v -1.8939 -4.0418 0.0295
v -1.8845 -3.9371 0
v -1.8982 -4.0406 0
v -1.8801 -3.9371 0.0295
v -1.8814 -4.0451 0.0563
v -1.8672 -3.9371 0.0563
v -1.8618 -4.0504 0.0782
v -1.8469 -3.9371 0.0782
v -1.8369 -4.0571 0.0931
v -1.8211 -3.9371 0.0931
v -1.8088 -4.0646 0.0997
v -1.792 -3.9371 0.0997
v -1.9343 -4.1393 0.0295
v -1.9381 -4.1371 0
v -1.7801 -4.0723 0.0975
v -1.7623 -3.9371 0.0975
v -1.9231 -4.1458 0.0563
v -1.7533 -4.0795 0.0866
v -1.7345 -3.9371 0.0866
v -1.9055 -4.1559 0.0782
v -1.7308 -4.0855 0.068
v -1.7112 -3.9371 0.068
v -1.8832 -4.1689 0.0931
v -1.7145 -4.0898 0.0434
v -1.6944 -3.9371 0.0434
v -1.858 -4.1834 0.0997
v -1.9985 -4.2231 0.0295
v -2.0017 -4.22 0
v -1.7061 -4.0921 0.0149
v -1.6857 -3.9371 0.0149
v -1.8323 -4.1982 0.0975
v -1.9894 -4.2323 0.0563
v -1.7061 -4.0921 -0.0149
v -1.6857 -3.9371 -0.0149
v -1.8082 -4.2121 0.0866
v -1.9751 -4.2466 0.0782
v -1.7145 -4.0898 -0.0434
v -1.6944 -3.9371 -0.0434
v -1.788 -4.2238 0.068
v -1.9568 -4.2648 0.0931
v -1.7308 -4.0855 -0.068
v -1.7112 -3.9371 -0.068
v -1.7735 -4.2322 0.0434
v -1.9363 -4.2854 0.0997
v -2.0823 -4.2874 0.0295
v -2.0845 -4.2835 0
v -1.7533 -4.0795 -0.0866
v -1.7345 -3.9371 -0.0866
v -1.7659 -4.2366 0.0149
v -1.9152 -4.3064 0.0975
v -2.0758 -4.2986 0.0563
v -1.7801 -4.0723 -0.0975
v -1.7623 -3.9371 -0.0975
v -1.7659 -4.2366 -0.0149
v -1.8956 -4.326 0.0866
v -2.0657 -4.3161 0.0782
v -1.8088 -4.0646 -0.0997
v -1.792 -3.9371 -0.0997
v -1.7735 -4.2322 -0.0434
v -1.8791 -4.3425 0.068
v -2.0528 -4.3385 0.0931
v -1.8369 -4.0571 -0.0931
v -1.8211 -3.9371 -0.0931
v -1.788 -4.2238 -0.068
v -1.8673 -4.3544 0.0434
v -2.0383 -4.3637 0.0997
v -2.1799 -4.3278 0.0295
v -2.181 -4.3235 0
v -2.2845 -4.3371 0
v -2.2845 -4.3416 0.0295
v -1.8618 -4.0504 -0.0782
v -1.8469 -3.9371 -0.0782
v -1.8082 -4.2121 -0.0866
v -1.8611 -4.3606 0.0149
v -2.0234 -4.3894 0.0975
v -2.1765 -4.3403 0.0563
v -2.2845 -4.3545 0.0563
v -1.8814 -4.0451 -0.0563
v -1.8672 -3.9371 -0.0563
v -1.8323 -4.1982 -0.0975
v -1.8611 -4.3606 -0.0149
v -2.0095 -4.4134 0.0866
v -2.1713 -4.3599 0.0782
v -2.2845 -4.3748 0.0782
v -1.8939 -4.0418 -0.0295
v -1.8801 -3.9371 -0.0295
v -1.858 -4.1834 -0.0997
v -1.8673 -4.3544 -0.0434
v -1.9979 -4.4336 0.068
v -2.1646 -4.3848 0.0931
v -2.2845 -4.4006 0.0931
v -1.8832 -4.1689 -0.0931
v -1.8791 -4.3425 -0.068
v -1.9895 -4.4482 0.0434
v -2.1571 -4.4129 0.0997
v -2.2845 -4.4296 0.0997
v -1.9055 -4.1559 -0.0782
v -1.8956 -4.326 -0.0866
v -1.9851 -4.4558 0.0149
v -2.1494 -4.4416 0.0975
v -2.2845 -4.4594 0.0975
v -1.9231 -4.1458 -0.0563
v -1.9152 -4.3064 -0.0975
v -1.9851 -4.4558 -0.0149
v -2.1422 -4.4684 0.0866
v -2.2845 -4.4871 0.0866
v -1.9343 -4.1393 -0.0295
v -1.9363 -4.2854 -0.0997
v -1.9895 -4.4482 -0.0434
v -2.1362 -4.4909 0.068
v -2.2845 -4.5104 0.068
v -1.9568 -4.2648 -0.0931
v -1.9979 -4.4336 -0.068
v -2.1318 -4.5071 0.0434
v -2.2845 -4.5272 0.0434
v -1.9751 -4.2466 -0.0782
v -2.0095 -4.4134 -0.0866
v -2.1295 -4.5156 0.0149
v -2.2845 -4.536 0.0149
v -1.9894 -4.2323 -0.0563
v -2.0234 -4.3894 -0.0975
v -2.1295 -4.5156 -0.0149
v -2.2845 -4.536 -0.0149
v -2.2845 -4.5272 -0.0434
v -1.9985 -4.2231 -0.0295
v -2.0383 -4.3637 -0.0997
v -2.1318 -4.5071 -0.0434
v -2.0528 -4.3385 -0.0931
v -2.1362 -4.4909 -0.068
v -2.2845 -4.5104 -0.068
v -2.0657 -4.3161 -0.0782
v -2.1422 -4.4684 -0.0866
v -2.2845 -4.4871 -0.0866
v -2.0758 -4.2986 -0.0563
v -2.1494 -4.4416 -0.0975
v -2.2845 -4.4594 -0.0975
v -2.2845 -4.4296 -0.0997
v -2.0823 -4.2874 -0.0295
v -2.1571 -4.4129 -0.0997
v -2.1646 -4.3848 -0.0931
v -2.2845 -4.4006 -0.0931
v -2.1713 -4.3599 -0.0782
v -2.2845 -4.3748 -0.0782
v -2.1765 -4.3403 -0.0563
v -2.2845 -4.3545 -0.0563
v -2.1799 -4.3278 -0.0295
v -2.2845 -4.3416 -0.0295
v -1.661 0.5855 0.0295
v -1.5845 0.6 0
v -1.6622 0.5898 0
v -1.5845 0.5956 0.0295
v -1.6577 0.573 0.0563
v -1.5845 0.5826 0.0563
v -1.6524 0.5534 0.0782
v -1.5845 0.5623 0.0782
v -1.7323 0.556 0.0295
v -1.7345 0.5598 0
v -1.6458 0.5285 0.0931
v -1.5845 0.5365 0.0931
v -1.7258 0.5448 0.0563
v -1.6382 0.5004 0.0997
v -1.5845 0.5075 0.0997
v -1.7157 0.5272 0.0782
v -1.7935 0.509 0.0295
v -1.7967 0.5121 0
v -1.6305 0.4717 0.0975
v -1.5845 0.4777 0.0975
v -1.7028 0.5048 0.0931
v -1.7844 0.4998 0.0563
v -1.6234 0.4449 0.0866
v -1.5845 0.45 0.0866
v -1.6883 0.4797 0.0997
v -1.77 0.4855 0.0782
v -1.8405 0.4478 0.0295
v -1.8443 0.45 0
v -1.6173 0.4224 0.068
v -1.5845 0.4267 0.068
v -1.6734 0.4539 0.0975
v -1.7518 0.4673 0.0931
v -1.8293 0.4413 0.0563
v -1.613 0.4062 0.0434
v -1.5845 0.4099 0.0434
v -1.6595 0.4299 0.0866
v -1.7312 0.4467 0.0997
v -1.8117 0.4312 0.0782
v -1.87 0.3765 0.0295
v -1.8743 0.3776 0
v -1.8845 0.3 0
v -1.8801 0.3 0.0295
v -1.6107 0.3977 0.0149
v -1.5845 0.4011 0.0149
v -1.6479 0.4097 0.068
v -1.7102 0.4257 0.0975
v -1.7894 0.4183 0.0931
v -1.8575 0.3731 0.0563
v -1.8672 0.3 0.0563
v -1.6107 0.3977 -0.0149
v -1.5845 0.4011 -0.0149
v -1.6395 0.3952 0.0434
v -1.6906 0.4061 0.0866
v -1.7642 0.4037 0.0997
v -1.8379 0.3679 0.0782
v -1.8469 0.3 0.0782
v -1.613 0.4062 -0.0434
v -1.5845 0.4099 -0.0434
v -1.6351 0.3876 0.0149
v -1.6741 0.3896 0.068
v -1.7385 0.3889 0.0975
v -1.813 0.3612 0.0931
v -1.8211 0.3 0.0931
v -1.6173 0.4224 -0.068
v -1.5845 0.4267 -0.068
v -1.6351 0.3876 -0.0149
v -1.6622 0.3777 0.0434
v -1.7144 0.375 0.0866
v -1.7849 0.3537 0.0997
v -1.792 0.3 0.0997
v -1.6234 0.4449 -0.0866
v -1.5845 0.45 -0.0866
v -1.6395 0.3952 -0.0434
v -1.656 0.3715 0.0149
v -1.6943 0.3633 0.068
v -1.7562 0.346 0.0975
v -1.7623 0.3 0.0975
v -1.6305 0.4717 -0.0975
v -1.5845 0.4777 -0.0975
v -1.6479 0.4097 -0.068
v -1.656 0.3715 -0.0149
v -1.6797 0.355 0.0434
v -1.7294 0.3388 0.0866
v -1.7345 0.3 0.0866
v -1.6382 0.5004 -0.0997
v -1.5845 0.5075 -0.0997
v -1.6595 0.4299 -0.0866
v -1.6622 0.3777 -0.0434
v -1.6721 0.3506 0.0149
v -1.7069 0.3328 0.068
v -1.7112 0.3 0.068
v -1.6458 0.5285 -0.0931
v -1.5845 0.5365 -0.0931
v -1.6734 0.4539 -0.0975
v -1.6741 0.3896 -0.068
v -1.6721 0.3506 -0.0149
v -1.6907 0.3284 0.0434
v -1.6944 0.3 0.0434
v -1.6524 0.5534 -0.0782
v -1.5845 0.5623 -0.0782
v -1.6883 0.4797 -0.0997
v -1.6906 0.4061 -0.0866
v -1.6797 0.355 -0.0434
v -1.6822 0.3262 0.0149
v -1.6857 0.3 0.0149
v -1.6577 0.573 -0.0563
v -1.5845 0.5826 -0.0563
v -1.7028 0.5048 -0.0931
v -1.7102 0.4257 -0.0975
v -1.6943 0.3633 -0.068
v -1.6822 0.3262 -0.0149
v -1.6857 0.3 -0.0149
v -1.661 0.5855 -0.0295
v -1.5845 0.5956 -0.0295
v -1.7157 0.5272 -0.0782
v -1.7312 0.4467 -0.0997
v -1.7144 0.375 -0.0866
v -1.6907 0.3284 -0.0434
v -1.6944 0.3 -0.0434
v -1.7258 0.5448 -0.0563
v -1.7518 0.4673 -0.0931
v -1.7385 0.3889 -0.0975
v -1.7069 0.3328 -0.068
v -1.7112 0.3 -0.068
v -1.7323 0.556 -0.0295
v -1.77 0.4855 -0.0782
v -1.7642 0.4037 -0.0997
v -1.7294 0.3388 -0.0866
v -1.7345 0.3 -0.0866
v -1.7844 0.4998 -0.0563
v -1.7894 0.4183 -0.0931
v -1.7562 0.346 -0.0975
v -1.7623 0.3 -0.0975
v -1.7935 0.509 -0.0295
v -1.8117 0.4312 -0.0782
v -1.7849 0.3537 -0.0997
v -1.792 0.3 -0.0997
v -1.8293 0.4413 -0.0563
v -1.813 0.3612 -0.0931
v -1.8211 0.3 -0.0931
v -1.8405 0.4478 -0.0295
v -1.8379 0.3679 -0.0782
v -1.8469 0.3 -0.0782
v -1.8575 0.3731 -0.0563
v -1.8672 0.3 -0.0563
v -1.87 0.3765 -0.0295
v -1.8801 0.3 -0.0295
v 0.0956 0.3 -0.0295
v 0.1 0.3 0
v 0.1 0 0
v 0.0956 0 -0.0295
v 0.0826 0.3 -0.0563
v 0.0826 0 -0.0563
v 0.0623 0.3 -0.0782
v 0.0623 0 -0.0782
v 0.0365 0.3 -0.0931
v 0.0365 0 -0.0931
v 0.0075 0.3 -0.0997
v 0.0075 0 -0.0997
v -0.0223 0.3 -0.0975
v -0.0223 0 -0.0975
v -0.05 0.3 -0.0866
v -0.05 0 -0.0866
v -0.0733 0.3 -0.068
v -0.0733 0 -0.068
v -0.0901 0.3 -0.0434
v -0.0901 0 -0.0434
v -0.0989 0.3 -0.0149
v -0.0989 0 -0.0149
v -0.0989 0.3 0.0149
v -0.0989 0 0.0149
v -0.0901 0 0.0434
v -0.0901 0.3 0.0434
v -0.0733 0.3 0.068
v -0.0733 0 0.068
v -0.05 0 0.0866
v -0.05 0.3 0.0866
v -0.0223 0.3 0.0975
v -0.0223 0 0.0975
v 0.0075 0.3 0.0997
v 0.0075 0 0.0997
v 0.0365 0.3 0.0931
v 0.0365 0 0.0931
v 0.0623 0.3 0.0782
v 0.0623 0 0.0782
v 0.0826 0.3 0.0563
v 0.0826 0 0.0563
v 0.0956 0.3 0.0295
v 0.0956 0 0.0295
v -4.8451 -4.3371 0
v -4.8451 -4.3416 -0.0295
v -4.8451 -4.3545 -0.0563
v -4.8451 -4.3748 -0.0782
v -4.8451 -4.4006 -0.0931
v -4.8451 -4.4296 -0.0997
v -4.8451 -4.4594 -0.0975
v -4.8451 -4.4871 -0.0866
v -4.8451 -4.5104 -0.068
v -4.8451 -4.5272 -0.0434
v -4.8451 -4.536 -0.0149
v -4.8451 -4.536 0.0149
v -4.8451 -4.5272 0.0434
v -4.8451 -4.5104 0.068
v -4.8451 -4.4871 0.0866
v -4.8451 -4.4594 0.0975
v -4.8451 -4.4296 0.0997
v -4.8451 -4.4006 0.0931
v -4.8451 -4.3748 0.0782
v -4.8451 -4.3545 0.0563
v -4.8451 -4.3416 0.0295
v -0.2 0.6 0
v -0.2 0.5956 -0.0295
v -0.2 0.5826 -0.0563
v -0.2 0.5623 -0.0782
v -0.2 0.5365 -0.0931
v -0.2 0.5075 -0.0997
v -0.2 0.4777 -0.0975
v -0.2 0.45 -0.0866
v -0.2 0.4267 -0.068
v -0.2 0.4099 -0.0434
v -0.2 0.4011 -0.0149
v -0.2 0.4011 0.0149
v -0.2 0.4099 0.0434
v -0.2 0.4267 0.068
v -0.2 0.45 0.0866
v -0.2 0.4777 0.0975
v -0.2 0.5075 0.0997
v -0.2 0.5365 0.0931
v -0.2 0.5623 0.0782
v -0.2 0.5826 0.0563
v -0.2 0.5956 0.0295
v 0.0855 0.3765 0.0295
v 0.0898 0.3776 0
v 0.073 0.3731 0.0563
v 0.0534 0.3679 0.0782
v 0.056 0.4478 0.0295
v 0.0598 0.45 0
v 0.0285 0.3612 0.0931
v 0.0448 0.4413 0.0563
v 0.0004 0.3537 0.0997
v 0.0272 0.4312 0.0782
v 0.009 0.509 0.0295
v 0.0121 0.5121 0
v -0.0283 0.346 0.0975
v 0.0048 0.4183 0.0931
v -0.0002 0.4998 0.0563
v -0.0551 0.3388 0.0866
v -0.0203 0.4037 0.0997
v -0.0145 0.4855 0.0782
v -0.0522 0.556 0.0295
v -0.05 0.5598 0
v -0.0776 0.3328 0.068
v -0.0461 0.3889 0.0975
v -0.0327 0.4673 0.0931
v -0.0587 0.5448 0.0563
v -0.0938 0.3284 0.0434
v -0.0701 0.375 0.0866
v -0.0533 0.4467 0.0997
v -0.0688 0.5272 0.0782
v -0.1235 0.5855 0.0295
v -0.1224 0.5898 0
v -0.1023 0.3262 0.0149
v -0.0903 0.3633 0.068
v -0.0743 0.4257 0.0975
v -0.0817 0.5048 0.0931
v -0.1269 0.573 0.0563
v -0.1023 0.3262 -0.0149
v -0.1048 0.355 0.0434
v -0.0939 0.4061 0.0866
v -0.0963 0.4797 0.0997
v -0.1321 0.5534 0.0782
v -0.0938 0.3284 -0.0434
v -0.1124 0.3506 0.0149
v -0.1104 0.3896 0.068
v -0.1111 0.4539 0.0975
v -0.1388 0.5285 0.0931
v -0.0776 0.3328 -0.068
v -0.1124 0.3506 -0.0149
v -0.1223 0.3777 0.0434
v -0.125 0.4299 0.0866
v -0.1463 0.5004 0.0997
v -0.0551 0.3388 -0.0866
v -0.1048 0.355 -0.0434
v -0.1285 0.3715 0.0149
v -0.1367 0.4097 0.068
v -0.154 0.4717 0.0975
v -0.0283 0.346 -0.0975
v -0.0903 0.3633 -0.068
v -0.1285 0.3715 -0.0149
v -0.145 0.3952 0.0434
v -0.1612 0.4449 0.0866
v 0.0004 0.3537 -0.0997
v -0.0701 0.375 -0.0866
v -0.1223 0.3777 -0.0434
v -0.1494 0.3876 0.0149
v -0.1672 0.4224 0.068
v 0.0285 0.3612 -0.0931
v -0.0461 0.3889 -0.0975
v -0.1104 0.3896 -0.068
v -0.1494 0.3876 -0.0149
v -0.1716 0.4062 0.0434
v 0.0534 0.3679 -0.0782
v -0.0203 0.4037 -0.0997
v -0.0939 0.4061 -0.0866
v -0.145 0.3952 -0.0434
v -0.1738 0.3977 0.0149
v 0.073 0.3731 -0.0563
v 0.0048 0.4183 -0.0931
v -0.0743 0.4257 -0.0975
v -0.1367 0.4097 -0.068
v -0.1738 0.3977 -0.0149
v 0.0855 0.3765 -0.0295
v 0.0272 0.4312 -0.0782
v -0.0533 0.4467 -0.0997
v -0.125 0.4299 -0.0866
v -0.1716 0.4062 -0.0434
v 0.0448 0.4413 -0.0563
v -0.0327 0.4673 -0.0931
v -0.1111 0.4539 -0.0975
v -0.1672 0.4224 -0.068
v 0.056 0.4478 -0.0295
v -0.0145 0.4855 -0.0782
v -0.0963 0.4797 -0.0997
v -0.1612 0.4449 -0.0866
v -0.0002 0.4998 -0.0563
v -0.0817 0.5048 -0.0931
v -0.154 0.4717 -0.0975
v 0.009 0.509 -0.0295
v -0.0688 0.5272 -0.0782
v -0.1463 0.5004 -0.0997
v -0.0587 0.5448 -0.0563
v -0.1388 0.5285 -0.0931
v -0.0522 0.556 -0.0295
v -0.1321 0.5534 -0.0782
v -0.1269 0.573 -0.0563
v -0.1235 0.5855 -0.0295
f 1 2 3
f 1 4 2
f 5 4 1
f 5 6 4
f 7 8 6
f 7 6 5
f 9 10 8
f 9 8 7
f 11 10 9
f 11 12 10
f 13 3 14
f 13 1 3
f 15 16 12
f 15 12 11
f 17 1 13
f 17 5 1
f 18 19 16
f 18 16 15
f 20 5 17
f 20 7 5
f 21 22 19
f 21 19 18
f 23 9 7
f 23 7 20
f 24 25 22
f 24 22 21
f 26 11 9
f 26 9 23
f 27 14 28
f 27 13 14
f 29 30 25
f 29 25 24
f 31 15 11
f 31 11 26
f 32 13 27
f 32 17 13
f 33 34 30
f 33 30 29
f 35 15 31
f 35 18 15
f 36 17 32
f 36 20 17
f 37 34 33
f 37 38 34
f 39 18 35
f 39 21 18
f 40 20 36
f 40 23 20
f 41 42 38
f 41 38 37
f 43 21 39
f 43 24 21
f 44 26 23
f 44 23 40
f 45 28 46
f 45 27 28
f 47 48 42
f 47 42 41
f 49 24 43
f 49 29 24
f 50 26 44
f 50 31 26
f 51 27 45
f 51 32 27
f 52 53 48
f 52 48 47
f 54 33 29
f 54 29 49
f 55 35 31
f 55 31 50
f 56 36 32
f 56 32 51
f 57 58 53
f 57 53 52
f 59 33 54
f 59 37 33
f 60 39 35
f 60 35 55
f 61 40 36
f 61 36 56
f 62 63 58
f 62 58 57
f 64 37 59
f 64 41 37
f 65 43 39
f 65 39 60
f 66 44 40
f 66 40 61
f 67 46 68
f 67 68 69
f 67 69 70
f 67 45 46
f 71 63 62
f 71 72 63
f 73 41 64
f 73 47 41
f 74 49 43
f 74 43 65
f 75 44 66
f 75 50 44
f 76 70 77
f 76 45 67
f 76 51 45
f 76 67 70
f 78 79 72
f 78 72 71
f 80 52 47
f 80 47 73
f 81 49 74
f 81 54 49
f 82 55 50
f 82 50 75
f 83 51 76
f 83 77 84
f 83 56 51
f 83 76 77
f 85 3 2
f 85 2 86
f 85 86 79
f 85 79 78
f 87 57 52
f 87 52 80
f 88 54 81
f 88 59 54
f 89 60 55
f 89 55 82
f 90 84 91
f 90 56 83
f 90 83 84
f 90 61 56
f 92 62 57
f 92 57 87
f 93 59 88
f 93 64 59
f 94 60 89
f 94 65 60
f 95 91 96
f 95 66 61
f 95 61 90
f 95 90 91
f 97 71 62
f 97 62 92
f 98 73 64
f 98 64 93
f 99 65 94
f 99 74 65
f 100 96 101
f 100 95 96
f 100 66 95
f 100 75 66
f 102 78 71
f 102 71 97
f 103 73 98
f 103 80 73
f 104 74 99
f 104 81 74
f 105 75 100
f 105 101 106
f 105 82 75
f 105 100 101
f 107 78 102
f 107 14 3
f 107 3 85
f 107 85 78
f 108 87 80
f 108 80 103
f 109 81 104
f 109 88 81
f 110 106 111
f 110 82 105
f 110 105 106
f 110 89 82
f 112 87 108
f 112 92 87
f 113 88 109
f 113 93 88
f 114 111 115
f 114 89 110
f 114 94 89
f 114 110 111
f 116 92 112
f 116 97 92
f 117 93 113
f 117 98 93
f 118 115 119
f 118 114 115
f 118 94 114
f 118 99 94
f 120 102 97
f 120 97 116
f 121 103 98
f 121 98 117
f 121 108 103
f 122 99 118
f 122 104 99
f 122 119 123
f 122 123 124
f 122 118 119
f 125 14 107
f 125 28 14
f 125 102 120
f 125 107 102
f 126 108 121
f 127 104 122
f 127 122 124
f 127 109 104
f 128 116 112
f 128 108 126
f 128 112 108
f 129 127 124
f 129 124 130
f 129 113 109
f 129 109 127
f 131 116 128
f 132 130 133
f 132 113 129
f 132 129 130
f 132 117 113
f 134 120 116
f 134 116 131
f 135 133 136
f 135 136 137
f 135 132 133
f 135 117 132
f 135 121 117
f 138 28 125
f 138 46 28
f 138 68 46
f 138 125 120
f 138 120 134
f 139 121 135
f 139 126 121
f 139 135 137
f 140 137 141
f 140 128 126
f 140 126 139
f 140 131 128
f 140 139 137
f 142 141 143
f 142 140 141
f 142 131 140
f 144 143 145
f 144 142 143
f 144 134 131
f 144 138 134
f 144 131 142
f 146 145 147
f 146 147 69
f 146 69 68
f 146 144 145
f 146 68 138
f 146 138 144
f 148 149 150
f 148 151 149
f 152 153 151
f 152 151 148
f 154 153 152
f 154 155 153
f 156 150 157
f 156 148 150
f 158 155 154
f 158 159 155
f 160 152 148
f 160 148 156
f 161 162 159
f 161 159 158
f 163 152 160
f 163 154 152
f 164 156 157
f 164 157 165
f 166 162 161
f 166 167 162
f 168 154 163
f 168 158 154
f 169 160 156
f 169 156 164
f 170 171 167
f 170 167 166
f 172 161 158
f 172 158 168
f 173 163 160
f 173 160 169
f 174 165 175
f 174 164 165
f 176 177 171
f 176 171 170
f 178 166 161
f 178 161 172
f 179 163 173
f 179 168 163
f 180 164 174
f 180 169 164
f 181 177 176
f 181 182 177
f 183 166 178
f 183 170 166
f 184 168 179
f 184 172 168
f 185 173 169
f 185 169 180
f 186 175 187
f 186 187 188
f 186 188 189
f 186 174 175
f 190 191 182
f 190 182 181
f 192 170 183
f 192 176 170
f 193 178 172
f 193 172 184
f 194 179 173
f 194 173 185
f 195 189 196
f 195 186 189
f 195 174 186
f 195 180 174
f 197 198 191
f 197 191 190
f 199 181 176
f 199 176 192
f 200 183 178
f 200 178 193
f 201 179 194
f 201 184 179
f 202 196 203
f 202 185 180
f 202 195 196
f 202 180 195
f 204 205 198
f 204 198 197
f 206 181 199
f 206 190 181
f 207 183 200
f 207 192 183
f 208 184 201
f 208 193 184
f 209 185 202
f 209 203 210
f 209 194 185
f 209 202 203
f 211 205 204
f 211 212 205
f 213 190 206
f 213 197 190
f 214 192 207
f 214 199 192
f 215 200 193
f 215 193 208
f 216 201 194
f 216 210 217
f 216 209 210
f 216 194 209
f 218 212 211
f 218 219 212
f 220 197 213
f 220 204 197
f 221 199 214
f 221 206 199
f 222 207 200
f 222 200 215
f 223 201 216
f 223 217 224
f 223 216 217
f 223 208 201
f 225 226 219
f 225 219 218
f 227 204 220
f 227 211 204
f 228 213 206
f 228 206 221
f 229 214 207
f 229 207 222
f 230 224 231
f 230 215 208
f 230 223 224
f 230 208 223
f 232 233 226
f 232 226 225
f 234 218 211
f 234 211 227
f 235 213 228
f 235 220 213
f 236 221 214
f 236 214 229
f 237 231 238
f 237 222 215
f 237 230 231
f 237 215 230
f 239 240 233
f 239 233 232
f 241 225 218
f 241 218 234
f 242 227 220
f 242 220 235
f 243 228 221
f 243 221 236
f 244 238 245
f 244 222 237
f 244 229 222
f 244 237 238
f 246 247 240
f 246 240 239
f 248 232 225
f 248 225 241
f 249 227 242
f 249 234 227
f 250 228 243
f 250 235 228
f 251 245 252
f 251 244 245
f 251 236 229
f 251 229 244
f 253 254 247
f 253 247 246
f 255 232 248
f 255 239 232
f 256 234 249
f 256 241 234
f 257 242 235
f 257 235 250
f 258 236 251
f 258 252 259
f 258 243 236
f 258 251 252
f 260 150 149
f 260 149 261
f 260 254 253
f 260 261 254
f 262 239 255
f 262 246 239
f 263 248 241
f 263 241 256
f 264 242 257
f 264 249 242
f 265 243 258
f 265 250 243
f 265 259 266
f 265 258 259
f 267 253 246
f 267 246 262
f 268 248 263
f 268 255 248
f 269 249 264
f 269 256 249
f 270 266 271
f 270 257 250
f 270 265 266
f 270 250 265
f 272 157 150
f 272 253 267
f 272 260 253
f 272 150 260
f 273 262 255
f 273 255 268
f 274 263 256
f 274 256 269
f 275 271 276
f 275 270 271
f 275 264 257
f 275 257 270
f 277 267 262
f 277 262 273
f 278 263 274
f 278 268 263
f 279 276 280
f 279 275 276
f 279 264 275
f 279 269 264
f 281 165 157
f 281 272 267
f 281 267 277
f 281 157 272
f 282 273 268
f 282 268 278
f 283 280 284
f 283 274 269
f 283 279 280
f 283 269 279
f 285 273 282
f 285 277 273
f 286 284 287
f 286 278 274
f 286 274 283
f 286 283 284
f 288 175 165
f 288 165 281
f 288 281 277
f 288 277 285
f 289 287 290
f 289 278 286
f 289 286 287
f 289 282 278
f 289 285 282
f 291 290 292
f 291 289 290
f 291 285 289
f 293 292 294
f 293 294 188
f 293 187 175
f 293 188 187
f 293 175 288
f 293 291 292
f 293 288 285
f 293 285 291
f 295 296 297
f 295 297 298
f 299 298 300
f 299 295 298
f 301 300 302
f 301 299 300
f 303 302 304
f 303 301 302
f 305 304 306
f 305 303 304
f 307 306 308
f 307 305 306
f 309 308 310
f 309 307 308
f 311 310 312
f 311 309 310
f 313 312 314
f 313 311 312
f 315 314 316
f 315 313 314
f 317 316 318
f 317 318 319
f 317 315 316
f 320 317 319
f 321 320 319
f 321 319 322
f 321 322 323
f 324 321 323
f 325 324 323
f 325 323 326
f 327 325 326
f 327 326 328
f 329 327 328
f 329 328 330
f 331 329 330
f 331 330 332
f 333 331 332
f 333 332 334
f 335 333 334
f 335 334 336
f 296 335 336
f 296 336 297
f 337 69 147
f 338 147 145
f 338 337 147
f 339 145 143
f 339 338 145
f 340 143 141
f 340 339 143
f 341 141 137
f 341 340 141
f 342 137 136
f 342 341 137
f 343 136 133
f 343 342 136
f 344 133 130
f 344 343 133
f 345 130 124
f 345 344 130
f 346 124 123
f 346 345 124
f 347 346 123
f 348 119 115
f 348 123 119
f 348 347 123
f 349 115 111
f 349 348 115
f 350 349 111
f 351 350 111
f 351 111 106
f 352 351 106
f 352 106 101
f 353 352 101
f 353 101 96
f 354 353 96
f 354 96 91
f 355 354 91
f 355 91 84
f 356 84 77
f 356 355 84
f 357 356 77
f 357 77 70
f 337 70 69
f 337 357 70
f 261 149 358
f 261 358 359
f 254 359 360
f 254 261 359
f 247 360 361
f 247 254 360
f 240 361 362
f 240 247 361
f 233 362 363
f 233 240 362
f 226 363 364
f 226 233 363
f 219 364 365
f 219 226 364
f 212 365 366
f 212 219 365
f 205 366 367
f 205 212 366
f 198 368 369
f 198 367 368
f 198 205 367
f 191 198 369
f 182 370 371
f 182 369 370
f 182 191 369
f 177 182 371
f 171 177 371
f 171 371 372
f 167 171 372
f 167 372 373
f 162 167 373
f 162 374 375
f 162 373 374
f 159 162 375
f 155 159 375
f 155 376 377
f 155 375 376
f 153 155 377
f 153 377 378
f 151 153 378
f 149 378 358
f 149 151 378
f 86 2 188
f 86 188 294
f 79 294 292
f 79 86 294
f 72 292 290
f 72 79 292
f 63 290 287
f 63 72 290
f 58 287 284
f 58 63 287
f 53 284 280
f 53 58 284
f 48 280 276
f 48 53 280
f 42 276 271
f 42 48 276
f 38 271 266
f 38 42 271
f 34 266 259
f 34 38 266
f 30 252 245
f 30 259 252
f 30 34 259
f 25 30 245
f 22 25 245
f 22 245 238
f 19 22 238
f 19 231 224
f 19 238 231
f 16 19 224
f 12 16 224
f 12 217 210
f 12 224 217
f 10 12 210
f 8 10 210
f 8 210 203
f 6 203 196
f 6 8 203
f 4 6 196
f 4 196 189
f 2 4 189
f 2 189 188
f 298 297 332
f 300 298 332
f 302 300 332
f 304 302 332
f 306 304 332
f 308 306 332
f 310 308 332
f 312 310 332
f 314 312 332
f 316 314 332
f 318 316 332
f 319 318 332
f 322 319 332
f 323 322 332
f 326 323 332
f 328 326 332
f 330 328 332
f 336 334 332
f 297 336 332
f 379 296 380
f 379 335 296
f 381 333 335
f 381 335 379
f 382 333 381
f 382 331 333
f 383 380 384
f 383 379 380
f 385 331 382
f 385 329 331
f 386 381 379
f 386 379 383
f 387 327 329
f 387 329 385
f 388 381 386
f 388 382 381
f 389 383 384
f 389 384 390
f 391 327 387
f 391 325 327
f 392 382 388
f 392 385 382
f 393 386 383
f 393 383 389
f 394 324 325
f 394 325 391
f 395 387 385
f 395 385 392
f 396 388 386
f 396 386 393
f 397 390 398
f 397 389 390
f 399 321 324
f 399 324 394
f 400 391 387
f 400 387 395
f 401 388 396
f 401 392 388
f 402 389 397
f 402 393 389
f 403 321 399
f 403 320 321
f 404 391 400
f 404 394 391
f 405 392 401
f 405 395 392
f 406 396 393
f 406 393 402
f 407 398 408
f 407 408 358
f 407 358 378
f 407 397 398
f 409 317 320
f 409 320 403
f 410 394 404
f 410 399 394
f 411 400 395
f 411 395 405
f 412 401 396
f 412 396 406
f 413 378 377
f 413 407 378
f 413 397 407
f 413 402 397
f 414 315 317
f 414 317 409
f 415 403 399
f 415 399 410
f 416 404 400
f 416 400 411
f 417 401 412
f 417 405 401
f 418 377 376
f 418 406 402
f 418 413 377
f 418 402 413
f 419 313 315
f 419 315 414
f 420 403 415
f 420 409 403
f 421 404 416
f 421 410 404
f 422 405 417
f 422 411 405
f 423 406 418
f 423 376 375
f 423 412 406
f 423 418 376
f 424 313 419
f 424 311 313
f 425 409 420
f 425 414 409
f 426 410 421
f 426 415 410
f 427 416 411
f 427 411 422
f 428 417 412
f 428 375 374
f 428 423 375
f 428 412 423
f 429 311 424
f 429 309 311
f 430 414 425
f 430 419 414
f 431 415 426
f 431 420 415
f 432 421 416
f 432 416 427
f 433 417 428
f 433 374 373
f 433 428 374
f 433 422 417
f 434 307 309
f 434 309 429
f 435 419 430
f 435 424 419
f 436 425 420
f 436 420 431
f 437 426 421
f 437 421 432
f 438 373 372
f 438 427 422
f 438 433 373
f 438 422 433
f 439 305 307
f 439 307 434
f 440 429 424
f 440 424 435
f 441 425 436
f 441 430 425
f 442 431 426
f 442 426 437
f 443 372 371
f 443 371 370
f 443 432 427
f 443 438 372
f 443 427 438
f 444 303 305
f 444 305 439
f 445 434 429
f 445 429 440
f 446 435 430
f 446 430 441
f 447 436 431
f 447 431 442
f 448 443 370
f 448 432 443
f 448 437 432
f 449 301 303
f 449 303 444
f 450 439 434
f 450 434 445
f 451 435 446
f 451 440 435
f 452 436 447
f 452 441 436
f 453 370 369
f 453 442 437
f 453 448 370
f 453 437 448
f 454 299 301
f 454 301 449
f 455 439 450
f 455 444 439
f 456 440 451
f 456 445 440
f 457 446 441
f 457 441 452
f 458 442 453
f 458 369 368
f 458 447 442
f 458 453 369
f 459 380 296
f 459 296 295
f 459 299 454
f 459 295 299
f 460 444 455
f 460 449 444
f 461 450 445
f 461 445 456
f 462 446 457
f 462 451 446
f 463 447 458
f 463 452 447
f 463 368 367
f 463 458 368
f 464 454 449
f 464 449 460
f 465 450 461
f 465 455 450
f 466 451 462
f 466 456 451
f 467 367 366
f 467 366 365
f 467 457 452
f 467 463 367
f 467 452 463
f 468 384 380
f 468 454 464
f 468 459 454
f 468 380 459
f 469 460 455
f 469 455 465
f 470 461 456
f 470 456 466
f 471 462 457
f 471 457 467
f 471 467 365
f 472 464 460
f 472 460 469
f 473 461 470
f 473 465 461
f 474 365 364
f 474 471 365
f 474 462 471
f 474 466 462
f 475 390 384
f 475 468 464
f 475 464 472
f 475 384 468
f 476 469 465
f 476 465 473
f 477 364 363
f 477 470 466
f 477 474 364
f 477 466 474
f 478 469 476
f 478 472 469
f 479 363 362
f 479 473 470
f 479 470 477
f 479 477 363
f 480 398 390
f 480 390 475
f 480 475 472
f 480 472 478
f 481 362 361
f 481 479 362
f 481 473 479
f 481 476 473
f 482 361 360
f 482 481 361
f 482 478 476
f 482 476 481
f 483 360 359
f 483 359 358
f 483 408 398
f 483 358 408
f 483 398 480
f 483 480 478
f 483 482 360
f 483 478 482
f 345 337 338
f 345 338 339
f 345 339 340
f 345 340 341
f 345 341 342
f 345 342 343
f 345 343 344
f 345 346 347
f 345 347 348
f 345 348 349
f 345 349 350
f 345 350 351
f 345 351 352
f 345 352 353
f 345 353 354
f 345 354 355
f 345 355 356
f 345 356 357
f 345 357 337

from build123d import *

# Parameters (mm, degrees)
ESQUISSE2_R = 0.1


with BuildPart() as part:
    # Balayage1: sweep along a path in Esquisse1
    with BuildLine(Plane.XY) as balayage1_path:
        Line((0, 0), (0, 0.3))
        ThreePointArc((0, 0.3), (-0.058578644, 0.441421356), (-0.2, 0.5))
        Line((-0.2, 0.5), (-1.584533741, 0.5))
        ThreePointArc((-1.584533741, 0.5), (-1.725955098, 0.441421356), (-1.784533741, 0.3))
        Line((-1.784533741, 0.3), (-1.784533741, -3.937120931))
        ThreePointArc((-1.784533741, -3.937120931), (-1.930980351, -4.290674321), (-2.284533741, -4.437120931))
        Line((-2.284533741, -4.437120931), (-4.845117945, -4.437120931))
    # Esquisse2 → Balayage1 (sweep)
    with BuildSketch(Plane(origin=(0, 0, 0), x_dir=(1, 0, 0), z_dir=(0, 1, 0))):
        Circle(ESQUISSE2_R)
    sweep(path=balayage1_path.line)


solid = part.part
